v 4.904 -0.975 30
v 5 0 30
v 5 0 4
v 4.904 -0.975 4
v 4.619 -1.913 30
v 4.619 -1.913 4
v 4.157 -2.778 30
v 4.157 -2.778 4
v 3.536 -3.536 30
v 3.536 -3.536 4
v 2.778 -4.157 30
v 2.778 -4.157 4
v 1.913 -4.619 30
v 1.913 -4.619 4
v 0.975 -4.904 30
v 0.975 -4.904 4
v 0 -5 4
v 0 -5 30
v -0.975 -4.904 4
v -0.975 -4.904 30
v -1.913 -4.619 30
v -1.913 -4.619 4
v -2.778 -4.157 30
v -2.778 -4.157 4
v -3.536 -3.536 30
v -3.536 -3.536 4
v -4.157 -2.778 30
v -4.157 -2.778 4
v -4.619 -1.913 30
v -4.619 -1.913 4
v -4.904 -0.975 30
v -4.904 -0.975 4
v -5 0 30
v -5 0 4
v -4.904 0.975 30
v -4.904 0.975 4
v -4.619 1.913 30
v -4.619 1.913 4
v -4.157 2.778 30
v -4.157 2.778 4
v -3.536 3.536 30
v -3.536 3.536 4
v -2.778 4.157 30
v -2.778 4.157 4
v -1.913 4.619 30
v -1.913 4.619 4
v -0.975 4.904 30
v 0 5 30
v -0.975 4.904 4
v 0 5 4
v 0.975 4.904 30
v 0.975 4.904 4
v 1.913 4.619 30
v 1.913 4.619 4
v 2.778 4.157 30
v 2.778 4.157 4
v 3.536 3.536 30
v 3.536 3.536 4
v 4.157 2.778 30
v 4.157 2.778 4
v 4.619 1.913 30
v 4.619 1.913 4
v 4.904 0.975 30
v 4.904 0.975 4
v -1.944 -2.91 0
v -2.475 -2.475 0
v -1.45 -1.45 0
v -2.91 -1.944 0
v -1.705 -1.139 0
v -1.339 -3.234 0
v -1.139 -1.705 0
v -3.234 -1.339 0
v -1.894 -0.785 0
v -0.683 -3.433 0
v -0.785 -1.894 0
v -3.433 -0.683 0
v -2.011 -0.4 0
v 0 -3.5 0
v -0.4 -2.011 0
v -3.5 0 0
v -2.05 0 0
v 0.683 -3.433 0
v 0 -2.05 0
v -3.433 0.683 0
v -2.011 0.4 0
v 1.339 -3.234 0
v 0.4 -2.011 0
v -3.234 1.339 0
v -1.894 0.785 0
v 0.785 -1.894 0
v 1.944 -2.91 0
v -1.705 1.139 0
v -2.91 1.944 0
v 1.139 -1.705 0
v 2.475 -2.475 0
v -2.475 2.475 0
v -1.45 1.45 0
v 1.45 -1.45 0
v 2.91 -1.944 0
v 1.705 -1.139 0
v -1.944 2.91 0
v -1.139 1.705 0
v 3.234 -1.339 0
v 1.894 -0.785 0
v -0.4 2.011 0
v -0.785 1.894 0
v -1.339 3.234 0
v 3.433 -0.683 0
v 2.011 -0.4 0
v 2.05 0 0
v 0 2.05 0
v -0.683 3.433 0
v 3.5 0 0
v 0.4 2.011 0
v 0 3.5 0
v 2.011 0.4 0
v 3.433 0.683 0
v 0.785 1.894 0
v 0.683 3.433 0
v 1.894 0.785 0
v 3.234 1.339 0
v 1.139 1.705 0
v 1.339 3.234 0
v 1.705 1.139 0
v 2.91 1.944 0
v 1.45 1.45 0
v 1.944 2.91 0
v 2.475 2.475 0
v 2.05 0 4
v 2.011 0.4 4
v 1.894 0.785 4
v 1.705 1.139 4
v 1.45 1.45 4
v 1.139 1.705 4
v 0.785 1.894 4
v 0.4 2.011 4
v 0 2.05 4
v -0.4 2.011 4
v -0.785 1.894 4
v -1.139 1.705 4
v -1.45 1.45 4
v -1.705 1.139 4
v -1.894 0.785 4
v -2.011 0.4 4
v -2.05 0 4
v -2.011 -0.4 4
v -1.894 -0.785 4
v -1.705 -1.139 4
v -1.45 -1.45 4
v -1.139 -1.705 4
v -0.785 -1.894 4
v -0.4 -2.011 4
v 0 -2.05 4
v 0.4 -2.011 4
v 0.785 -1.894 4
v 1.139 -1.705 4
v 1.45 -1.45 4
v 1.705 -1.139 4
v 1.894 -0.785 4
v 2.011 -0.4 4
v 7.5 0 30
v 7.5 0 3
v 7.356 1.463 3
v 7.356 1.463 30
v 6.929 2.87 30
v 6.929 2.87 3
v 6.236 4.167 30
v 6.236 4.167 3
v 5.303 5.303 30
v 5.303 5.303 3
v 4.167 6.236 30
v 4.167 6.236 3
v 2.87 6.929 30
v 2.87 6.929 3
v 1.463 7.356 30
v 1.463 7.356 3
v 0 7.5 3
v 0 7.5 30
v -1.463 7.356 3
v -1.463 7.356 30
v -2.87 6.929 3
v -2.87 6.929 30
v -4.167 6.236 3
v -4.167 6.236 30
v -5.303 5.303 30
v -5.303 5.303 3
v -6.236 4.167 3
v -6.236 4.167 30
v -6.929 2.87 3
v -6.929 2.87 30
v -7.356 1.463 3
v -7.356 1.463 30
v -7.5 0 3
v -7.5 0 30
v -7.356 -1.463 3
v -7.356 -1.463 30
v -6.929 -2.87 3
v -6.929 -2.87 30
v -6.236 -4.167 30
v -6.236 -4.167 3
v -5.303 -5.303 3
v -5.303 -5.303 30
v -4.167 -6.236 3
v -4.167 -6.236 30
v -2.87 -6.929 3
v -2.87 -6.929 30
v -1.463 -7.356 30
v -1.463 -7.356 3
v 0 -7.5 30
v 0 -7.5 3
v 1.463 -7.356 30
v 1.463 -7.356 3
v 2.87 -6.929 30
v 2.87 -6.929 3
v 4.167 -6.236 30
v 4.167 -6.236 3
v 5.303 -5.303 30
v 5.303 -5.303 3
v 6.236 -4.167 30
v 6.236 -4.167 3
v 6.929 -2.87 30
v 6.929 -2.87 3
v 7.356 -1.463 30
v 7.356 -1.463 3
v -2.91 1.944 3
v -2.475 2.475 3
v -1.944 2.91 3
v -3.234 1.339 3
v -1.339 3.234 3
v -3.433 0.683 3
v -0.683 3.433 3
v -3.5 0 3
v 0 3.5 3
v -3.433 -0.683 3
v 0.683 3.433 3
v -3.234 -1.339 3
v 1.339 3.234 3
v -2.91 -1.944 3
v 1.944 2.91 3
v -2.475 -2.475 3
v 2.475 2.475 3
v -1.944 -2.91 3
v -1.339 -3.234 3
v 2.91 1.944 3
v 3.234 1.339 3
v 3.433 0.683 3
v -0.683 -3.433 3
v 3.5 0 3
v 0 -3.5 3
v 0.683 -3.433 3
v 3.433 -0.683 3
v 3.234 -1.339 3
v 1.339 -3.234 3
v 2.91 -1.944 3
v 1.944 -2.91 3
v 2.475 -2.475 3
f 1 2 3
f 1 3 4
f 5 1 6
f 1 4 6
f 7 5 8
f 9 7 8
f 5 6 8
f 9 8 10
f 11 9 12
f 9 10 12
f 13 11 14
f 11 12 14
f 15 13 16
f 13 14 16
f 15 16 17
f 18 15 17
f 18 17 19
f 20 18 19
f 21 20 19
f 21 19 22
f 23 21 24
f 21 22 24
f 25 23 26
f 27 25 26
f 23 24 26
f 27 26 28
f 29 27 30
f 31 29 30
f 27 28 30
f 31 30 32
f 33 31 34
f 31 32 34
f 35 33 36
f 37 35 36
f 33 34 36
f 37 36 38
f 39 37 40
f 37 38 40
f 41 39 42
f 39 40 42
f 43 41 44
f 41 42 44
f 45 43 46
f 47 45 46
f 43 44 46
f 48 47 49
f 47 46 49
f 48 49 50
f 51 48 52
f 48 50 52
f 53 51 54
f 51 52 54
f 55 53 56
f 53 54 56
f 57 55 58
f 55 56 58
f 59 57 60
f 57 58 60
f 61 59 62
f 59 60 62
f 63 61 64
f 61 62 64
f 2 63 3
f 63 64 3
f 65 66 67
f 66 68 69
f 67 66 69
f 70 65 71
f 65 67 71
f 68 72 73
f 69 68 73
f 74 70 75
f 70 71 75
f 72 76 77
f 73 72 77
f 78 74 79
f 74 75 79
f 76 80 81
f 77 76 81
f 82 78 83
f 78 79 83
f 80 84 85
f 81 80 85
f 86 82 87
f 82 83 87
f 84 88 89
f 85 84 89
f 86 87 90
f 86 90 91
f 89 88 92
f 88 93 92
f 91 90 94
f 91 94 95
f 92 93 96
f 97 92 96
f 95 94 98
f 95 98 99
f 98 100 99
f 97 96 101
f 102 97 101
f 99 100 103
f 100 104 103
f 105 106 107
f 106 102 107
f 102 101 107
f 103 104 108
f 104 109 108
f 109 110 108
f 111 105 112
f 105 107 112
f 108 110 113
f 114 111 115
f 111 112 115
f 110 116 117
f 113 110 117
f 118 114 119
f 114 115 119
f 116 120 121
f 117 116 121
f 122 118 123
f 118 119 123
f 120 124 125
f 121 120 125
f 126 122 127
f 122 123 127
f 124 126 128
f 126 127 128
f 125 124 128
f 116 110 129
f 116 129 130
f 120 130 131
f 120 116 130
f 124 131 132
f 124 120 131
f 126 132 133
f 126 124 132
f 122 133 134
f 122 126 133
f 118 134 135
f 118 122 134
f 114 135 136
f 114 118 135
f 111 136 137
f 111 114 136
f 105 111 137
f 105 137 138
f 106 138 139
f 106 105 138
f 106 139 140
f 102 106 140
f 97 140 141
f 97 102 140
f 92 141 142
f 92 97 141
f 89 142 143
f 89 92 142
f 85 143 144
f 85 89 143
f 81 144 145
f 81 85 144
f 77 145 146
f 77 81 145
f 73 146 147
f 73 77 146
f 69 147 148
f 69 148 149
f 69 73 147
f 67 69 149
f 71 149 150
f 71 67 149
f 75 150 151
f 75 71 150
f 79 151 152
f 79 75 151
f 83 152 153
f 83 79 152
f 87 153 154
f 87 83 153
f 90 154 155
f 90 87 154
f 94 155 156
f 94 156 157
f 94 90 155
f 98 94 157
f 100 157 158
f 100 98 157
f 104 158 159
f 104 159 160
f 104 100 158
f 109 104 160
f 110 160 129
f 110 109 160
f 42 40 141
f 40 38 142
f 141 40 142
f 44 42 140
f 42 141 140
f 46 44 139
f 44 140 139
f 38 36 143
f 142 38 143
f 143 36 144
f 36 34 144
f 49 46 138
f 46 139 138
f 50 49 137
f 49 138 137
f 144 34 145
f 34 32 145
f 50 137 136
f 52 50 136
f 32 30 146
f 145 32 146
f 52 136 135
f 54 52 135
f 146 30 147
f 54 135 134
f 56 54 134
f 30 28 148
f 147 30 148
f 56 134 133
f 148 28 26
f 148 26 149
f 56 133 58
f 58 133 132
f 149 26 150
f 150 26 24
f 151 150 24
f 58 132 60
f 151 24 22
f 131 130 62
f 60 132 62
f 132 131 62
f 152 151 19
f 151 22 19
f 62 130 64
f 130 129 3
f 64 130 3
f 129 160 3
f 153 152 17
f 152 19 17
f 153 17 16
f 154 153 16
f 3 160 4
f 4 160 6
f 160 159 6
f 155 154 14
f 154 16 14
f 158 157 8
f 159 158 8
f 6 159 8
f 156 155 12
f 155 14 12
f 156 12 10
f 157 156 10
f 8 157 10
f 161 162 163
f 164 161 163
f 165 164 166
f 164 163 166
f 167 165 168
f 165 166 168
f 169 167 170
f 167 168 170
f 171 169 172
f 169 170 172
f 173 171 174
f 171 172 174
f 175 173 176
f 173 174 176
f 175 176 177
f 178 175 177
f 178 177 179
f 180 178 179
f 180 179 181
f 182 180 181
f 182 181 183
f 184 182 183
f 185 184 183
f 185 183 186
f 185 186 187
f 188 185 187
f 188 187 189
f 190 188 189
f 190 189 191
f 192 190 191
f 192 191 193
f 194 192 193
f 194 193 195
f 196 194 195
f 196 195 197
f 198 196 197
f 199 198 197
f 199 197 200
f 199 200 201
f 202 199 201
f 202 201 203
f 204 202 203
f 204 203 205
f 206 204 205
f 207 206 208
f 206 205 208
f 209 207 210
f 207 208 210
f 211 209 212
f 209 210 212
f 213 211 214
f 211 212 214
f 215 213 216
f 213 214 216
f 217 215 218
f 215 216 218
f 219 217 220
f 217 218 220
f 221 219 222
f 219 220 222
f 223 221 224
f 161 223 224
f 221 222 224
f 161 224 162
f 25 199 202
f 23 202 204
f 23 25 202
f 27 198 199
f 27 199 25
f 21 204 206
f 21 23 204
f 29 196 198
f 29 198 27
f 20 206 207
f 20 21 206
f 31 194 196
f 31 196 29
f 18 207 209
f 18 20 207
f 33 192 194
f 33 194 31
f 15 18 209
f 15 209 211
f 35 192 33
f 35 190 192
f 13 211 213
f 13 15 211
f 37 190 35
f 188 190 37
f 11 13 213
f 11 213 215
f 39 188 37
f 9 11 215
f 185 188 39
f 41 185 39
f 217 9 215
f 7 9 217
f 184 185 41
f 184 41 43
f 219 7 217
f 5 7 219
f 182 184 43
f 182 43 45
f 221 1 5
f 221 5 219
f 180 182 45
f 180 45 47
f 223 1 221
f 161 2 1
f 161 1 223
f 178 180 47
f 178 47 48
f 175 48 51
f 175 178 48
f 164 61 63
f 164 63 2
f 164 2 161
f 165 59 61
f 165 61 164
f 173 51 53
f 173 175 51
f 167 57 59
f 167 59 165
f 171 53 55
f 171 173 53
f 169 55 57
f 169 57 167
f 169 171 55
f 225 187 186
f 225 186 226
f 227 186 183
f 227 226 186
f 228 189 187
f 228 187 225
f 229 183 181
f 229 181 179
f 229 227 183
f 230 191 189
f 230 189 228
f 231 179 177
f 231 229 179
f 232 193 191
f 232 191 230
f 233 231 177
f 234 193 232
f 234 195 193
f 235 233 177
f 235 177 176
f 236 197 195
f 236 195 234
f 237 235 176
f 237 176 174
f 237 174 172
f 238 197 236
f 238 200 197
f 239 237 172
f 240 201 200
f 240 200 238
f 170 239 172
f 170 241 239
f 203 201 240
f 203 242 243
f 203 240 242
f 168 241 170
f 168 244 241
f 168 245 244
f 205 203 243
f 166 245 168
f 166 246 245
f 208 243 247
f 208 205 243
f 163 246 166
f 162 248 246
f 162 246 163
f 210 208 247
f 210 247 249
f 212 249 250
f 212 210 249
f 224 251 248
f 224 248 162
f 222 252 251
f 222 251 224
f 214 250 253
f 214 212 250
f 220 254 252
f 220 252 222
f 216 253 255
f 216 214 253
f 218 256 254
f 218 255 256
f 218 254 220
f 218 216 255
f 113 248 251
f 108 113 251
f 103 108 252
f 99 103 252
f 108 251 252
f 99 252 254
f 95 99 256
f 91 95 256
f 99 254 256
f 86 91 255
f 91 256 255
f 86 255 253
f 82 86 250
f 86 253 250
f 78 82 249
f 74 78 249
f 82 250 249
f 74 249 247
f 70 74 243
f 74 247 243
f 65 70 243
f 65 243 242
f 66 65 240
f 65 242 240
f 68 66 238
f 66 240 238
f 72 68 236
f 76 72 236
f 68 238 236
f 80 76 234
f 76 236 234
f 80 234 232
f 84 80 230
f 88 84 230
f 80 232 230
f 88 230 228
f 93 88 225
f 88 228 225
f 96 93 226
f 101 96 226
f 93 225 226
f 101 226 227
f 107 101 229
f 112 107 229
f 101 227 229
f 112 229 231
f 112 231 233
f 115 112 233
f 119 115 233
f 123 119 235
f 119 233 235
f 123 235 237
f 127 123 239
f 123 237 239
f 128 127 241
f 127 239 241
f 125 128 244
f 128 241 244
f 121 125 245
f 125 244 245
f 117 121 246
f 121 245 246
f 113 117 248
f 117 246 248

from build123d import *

# Parameters (mm, degrees)
F0_R     = 7.5
F1_DEPTH = 30
F2_R     = 2.05
F3_DEPTH = 4
F5_R     = 5
F6_DEPTH = 26
F8_R     = 7.5
F8_R_2   = 3.5
F9_DEPTH = 3


with BuildPart() as f1:
    # F0 (on Top) → F1 (new body)
    with BuildSketch(Plane.XY):
        Circle(F0_R)
    extrude(amount=F1_DEPTH)

    # F2 (on Top) → F3 (cut)
    with BuildSketch(Plane.XY):
        Circle(F2_R)
    extrude(amount=F3_DEPTH, mode=Mode.SUBTRACT)

    # F5 (on offset) → F6 (cut, through all)
    with BuildSketch(Plane(origin=(0, 0, 4), x_dir=(1, 0, 0), z_dir=(0, 0, -1))):
        Circle(F5_R)
    extrude(amount=-F6_DEPTH, mode=Mode.SUBTRACT)

    # F8 (on offset) → F9 (cut, through all)
    with BuildSketch(Plane(origin=(0, 0, 3), x_dir=(1, 0, 0), z_dir=(0, 0, -1))):
        Circle(F8_R)
        Circle(F8_R_2, mode=Mode.SUBTRACT)
    extrude(amount=F9_DEPTH, mode=Mode.SUBTRACT)


solid = f1.part
